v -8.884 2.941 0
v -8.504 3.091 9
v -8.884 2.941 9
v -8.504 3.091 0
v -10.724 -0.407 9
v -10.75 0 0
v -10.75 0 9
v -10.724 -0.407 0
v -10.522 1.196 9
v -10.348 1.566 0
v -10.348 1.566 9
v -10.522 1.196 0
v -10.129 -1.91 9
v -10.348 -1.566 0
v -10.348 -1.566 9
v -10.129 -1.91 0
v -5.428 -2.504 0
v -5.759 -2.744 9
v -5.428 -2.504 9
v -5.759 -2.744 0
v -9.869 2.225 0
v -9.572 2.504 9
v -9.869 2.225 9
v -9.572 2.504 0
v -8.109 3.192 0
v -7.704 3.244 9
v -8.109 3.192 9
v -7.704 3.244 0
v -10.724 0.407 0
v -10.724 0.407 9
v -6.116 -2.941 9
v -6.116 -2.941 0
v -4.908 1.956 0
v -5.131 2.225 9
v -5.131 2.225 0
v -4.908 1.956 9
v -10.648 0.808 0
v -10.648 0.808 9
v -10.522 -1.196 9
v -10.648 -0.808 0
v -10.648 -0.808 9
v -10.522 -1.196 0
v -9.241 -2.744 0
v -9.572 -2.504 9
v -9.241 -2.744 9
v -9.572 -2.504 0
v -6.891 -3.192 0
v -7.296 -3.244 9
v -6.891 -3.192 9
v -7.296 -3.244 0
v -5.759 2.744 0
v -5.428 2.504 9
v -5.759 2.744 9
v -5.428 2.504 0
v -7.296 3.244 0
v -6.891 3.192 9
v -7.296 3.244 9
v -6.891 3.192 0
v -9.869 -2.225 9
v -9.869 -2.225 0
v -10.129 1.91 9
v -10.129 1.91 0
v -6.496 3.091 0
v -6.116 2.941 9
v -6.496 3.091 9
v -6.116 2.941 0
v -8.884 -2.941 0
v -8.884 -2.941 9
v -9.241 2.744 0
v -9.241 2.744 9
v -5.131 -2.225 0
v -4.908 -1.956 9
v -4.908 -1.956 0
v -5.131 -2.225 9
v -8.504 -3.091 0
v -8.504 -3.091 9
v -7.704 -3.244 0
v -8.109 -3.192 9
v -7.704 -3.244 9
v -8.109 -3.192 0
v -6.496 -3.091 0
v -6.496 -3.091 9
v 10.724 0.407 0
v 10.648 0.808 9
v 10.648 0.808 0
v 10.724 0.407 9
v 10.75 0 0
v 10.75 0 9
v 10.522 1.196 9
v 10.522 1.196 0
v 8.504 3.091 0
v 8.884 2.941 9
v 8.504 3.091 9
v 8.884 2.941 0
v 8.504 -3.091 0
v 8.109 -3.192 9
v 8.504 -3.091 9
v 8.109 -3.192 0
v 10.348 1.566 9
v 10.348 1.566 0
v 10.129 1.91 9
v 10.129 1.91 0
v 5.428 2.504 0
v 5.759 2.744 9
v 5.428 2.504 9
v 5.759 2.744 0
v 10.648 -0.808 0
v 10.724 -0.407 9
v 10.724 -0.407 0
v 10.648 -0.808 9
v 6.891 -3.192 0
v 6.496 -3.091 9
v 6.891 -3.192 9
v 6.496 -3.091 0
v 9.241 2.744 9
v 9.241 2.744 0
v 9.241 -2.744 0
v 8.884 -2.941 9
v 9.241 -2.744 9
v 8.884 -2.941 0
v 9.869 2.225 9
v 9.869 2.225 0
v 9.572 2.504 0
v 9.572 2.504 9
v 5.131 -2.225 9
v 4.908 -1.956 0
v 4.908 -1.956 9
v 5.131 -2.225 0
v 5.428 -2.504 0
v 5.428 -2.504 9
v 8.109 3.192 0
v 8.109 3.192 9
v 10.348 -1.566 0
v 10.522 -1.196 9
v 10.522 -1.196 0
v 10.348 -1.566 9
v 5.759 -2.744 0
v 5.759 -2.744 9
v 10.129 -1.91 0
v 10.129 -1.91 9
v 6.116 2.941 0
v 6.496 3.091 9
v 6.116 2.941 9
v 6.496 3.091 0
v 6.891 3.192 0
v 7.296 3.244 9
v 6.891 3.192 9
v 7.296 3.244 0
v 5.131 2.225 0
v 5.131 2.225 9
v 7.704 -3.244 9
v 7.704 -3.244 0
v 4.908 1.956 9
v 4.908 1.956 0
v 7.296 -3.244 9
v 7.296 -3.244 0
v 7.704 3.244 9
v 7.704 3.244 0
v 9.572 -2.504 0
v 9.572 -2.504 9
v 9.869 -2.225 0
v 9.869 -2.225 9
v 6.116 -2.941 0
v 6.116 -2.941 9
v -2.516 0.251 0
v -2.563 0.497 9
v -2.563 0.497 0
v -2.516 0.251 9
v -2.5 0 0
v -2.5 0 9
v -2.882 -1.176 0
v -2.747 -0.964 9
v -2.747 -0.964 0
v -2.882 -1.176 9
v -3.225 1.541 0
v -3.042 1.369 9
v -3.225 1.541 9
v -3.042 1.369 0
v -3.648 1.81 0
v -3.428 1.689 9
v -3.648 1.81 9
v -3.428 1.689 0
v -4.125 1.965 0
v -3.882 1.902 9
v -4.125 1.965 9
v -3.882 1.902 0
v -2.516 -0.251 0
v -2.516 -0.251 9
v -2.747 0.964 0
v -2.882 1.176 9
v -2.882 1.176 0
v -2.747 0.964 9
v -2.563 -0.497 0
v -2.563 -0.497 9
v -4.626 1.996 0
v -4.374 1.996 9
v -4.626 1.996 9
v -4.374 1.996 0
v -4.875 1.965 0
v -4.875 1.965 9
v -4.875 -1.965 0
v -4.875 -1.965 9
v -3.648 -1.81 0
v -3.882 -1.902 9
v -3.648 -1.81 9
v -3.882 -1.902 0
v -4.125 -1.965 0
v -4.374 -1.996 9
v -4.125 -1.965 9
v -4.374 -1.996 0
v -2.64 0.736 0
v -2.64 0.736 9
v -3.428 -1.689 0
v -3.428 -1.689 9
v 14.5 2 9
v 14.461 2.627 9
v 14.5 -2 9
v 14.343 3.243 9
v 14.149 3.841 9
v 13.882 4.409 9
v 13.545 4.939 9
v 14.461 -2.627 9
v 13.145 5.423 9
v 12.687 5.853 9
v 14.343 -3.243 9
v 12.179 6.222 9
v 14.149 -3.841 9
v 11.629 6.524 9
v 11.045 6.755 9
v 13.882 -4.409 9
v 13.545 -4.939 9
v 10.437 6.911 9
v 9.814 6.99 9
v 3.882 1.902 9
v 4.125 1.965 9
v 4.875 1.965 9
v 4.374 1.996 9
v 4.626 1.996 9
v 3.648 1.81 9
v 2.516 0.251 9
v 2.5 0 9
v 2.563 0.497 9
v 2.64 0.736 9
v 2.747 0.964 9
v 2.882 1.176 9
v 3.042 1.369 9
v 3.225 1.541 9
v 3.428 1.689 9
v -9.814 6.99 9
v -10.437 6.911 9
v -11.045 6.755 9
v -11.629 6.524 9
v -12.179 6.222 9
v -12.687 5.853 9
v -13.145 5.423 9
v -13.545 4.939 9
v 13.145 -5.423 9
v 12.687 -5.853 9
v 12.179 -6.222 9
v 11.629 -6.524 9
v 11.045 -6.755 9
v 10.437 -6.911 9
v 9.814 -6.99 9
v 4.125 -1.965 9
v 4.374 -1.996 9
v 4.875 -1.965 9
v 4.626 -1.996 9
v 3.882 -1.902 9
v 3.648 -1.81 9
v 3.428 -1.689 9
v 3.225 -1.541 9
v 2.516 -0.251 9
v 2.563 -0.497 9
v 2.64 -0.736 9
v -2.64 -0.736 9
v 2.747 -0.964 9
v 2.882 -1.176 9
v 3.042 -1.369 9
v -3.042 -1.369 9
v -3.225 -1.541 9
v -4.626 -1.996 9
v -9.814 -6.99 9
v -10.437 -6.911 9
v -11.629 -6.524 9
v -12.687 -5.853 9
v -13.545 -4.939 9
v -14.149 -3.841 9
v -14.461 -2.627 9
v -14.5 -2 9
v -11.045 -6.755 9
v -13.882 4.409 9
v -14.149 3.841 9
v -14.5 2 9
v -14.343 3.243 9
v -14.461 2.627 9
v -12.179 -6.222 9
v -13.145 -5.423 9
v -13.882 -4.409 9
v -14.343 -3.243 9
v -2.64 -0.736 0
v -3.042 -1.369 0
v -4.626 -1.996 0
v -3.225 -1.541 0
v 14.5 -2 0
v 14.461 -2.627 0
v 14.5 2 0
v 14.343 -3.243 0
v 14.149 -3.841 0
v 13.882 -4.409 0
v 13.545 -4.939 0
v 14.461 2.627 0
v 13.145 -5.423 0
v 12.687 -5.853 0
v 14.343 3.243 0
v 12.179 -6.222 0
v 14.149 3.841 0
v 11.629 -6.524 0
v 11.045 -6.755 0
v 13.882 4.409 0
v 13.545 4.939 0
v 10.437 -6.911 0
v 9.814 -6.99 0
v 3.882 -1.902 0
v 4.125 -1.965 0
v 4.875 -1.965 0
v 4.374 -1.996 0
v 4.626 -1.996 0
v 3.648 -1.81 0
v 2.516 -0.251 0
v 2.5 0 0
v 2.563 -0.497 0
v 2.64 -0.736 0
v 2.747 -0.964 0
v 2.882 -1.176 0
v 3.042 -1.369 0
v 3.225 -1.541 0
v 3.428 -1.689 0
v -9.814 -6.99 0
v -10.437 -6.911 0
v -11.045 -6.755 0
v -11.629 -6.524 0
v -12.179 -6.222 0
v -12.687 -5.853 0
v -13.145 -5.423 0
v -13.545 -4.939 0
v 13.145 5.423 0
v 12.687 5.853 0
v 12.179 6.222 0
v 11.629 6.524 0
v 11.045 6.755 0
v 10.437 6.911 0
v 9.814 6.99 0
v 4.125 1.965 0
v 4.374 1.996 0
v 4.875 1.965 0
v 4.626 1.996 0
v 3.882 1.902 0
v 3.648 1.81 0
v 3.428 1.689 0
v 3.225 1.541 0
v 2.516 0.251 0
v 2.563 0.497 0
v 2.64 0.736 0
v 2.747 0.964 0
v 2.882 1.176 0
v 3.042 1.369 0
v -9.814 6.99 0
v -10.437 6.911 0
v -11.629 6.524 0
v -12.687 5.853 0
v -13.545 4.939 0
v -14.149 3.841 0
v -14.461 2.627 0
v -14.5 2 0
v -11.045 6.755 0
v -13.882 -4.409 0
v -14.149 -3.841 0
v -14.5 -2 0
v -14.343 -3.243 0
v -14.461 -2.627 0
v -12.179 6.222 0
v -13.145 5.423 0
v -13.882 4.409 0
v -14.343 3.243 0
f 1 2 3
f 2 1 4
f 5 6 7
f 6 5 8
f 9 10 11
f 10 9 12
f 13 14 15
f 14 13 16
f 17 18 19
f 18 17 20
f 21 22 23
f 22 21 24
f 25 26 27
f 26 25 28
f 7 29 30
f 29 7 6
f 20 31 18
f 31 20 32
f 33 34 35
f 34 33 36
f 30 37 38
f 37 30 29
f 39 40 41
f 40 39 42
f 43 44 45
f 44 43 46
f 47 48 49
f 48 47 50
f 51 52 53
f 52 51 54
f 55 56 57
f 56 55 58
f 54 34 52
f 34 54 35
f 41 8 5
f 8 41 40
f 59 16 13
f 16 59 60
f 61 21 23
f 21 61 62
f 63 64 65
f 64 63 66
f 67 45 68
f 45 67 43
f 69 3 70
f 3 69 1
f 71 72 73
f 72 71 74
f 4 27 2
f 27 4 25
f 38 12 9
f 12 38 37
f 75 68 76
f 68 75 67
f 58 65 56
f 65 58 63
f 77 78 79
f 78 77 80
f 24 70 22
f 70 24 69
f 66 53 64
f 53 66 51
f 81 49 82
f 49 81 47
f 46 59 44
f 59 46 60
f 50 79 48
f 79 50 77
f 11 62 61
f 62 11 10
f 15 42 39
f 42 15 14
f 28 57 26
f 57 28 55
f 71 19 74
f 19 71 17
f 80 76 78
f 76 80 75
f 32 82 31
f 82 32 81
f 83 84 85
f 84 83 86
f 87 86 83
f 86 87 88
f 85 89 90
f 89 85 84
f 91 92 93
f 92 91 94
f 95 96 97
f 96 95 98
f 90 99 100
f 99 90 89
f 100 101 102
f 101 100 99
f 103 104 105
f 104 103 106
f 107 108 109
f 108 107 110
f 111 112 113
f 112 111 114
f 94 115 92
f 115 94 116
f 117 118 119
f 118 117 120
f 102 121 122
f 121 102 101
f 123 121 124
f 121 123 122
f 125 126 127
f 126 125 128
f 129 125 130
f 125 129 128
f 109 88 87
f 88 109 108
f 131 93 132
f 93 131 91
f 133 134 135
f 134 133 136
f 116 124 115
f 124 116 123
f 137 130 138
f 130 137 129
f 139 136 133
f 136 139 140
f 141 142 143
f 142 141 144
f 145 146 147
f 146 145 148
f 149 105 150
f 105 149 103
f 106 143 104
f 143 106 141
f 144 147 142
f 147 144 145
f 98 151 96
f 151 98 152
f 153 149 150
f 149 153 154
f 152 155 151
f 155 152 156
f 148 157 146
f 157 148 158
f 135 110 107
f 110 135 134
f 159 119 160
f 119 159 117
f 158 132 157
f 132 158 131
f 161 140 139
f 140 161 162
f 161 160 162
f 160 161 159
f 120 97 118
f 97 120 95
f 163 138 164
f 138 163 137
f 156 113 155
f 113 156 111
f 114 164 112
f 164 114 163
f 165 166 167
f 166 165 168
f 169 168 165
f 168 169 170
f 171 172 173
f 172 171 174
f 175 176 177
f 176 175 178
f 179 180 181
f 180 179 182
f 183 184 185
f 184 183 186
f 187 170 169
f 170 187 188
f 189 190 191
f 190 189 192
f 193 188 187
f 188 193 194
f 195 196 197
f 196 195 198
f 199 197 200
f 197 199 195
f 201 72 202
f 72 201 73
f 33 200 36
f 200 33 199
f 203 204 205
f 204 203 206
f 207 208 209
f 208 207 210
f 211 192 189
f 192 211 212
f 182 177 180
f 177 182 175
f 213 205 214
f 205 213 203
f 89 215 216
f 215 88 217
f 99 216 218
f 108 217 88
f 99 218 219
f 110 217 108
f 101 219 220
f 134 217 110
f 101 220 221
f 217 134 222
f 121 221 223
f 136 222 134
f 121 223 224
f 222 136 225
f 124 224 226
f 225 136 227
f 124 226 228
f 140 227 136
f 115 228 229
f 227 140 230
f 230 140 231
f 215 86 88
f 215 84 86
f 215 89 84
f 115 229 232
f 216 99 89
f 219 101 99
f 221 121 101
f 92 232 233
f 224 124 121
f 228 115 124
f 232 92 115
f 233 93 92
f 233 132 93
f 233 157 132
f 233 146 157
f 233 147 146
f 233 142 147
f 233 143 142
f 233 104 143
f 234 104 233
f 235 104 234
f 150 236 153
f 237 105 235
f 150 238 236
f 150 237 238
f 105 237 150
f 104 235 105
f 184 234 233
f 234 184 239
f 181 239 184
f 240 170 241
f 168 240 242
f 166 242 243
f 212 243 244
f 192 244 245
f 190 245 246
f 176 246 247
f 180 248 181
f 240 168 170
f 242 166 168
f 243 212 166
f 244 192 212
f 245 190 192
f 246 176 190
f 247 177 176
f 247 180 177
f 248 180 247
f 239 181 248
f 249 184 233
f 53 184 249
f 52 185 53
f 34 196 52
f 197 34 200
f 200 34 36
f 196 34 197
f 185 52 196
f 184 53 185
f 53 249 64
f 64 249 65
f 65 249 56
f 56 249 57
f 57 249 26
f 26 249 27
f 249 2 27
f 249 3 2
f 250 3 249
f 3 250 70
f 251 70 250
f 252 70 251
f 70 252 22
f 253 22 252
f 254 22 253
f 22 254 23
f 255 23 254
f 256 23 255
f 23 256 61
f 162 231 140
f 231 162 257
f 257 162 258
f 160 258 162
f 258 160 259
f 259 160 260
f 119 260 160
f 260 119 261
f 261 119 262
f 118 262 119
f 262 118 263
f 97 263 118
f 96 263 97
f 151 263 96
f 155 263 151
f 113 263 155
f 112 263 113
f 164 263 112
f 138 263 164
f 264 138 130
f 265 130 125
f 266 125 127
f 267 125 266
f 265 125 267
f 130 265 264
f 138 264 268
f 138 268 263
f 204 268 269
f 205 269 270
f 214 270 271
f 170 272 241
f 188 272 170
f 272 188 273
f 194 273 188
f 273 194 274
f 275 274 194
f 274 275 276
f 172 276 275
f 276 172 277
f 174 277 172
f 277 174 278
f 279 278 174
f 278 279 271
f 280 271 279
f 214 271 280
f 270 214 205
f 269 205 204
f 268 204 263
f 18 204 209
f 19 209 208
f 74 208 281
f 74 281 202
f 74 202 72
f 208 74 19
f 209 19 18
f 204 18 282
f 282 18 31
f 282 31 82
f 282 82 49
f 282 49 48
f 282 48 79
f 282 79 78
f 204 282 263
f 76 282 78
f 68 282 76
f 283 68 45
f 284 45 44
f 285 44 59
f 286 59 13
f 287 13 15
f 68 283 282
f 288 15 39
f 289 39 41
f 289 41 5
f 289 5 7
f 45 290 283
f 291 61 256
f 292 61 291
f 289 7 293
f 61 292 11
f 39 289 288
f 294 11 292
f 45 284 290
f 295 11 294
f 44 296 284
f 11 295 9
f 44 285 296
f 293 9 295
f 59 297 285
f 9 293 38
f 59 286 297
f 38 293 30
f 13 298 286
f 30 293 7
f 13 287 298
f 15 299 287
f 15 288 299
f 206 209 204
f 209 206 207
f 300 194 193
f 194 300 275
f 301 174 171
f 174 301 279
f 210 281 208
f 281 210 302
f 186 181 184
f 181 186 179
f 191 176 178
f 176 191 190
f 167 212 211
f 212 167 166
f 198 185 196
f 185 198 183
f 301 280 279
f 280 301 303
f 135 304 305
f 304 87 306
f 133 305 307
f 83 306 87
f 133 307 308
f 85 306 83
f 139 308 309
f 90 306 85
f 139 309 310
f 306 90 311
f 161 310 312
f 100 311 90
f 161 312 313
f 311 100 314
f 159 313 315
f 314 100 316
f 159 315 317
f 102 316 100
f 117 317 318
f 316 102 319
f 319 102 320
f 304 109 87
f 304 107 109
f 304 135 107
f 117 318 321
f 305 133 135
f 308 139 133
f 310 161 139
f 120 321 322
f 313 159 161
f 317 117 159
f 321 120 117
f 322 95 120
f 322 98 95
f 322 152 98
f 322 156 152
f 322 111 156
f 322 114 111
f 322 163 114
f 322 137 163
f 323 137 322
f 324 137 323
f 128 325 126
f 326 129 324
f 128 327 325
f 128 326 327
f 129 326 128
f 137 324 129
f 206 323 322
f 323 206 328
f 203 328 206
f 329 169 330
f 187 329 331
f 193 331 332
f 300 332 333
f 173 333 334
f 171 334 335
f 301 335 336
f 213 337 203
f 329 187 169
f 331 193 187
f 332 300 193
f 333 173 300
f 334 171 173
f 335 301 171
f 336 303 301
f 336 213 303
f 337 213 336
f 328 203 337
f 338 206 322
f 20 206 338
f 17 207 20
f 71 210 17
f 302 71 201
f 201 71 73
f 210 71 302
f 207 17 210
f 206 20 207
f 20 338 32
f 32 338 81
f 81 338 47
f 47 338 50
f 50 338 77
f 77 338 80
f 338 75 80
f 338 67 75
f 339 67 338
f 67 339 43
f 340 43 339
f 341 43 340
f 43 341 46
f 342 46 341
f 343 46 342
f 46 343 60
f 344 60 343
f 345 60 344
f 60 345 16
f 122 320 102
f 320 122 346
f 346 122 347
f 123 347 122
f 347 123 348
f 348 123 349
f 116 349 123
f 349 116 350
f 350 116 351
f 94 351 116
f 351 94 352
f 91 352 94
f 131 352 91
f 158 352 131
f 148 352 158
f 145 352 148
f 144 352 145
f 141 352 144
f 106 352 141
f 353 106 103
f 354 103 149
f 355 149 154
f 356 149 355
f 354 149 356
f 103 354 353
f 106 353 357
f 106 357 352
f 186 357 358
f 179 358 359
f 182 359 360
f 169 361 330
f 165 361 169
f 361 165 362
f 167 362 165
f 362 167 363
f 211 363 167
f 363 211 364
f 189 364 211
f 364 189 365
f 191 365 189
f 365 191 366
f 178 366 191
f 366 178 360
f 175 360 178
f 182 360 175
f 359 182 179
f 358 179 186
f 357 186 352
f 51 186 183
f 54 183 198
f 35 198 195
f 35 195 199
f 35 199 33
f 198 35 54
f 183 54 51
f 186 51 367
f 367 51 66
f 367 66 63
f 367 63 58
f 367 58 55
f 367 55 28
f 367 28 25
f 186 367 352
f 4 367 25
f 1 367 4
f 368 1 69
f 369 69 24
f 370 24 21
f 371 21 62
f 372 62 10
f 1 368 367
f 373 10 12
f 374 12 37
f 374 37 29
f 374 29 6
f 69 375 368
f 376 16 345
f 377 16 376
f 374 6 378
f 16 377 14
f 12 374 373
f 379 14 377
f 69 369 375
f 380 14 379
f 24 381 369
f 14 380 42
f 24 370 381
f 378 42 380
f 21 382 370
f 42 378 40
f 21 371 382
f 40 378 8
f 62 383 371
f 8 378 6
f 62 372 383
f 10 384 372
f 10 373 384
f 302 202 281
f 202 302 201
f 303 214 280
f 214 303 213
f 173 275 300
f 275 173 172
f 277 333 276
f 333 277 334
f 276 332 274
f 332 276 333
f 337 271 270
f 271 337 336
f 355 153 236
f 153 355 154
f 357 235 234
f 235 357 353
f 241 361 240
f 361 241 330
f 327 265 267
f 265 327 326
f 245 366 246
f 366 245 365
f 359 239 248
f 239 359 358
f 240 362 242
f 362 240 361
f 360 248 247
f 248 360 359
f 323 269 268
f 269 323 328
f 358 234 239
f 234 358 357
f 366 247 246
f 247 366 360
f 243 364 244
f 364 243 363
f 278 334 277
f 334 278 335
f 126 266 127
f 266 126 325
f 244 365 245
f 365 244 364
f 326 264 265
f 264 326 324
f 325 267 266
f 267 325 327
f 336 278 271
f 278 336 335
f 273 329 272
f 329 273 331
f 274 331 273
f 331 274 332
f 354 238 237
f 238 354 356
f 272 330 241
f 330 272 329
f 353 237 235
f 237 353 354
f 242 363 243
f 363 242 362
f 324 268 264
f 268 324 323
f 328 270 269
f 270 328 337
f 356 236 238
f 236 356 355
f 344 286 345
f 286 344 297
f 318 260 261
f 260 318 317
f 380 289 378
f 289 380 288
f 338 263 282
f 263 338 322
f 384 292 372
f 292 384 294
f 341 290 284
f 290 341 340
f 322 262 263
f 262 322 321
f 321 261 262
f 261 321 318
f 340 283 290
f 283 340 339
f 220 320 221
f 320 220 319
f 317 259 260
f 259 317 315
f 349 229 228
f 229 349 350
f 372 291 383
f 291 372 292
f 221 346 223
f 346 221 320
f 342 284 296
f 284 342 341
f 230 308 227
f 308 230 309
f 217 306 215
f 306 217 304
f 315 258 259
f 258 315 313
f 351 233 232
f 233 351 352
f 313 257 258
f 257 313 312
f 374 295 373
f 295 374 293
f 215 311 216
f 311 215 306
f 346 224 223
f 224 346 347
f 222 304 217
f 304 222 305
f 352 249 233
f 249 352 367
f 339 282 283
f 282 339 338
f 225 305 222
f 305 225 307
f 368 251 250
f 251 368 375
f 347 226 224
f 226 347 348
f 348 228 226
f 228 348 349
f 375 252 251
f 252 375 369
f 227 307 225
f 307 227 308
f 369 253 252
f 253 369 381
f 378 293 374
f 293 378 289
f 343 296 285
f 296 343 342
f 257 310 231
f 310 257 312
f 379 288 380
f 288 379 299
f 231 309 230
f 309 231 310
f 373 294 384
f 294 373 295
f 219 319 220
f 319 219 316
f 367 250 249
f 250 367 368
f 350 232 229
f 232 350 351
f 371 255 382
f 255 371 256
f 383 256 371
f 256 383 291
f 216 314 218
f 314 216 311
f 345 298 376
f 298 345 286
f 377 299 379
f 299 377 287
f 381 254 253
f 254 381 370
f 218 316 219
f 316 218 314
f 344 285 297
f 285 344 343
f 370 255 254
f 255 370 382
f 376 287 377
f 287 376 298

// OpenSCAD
$fn = 50;


difference() {
	union() {
		hull() {
			translate(v = [-9.5000000000, 2.0000000000, 0]) {
				cylinder(h = 9, r = 5);
			}
			translate(v = [9.5000000000, 2.0000000000, 0]) {
				cylinder(h = 9, r = 5);
			}
			translate(v = [-9.5000000000, -2.0000000000, 0]) {
				cylinder(h = 9, r = 5);
			}
			translate(v = [9.5000000000, -2.0000000000, 0]) {
				cylinder(h = 9, r = 5);
			}
		}
	}
	union() {
		#translate(v = [-7.5000000000, 0.0000000000, -100.0000000000]) {
			cylinder(h = 200, r = 3.2500000000);
		}
		#translate(v = [-7.5000000000, 0.0000000000, -100.0000000000]) {
			cylinder(h = 200, r = 3.2500000000);
		}
		#translate(v = [7.5000000000, 0.0000000000, -100.0000000000]) {
			cylinder(h = 200, r = 3.2500000000);
		}
		#translate(v = [7.5000000000, 0.0000000000, -100.0000000000]) {
			cylinder(h = 200, r = 3.2500000000);
		}
		#translate(v = [-4.5000000000, 0, 0]) {
			cylinder(h = 9, r = 2.0000000000);
		}
		#translate(v = [4.5000000000, 0, 0]) {
			cylinder(h = 9, r = 2.0000000000);
		}
	}
}
